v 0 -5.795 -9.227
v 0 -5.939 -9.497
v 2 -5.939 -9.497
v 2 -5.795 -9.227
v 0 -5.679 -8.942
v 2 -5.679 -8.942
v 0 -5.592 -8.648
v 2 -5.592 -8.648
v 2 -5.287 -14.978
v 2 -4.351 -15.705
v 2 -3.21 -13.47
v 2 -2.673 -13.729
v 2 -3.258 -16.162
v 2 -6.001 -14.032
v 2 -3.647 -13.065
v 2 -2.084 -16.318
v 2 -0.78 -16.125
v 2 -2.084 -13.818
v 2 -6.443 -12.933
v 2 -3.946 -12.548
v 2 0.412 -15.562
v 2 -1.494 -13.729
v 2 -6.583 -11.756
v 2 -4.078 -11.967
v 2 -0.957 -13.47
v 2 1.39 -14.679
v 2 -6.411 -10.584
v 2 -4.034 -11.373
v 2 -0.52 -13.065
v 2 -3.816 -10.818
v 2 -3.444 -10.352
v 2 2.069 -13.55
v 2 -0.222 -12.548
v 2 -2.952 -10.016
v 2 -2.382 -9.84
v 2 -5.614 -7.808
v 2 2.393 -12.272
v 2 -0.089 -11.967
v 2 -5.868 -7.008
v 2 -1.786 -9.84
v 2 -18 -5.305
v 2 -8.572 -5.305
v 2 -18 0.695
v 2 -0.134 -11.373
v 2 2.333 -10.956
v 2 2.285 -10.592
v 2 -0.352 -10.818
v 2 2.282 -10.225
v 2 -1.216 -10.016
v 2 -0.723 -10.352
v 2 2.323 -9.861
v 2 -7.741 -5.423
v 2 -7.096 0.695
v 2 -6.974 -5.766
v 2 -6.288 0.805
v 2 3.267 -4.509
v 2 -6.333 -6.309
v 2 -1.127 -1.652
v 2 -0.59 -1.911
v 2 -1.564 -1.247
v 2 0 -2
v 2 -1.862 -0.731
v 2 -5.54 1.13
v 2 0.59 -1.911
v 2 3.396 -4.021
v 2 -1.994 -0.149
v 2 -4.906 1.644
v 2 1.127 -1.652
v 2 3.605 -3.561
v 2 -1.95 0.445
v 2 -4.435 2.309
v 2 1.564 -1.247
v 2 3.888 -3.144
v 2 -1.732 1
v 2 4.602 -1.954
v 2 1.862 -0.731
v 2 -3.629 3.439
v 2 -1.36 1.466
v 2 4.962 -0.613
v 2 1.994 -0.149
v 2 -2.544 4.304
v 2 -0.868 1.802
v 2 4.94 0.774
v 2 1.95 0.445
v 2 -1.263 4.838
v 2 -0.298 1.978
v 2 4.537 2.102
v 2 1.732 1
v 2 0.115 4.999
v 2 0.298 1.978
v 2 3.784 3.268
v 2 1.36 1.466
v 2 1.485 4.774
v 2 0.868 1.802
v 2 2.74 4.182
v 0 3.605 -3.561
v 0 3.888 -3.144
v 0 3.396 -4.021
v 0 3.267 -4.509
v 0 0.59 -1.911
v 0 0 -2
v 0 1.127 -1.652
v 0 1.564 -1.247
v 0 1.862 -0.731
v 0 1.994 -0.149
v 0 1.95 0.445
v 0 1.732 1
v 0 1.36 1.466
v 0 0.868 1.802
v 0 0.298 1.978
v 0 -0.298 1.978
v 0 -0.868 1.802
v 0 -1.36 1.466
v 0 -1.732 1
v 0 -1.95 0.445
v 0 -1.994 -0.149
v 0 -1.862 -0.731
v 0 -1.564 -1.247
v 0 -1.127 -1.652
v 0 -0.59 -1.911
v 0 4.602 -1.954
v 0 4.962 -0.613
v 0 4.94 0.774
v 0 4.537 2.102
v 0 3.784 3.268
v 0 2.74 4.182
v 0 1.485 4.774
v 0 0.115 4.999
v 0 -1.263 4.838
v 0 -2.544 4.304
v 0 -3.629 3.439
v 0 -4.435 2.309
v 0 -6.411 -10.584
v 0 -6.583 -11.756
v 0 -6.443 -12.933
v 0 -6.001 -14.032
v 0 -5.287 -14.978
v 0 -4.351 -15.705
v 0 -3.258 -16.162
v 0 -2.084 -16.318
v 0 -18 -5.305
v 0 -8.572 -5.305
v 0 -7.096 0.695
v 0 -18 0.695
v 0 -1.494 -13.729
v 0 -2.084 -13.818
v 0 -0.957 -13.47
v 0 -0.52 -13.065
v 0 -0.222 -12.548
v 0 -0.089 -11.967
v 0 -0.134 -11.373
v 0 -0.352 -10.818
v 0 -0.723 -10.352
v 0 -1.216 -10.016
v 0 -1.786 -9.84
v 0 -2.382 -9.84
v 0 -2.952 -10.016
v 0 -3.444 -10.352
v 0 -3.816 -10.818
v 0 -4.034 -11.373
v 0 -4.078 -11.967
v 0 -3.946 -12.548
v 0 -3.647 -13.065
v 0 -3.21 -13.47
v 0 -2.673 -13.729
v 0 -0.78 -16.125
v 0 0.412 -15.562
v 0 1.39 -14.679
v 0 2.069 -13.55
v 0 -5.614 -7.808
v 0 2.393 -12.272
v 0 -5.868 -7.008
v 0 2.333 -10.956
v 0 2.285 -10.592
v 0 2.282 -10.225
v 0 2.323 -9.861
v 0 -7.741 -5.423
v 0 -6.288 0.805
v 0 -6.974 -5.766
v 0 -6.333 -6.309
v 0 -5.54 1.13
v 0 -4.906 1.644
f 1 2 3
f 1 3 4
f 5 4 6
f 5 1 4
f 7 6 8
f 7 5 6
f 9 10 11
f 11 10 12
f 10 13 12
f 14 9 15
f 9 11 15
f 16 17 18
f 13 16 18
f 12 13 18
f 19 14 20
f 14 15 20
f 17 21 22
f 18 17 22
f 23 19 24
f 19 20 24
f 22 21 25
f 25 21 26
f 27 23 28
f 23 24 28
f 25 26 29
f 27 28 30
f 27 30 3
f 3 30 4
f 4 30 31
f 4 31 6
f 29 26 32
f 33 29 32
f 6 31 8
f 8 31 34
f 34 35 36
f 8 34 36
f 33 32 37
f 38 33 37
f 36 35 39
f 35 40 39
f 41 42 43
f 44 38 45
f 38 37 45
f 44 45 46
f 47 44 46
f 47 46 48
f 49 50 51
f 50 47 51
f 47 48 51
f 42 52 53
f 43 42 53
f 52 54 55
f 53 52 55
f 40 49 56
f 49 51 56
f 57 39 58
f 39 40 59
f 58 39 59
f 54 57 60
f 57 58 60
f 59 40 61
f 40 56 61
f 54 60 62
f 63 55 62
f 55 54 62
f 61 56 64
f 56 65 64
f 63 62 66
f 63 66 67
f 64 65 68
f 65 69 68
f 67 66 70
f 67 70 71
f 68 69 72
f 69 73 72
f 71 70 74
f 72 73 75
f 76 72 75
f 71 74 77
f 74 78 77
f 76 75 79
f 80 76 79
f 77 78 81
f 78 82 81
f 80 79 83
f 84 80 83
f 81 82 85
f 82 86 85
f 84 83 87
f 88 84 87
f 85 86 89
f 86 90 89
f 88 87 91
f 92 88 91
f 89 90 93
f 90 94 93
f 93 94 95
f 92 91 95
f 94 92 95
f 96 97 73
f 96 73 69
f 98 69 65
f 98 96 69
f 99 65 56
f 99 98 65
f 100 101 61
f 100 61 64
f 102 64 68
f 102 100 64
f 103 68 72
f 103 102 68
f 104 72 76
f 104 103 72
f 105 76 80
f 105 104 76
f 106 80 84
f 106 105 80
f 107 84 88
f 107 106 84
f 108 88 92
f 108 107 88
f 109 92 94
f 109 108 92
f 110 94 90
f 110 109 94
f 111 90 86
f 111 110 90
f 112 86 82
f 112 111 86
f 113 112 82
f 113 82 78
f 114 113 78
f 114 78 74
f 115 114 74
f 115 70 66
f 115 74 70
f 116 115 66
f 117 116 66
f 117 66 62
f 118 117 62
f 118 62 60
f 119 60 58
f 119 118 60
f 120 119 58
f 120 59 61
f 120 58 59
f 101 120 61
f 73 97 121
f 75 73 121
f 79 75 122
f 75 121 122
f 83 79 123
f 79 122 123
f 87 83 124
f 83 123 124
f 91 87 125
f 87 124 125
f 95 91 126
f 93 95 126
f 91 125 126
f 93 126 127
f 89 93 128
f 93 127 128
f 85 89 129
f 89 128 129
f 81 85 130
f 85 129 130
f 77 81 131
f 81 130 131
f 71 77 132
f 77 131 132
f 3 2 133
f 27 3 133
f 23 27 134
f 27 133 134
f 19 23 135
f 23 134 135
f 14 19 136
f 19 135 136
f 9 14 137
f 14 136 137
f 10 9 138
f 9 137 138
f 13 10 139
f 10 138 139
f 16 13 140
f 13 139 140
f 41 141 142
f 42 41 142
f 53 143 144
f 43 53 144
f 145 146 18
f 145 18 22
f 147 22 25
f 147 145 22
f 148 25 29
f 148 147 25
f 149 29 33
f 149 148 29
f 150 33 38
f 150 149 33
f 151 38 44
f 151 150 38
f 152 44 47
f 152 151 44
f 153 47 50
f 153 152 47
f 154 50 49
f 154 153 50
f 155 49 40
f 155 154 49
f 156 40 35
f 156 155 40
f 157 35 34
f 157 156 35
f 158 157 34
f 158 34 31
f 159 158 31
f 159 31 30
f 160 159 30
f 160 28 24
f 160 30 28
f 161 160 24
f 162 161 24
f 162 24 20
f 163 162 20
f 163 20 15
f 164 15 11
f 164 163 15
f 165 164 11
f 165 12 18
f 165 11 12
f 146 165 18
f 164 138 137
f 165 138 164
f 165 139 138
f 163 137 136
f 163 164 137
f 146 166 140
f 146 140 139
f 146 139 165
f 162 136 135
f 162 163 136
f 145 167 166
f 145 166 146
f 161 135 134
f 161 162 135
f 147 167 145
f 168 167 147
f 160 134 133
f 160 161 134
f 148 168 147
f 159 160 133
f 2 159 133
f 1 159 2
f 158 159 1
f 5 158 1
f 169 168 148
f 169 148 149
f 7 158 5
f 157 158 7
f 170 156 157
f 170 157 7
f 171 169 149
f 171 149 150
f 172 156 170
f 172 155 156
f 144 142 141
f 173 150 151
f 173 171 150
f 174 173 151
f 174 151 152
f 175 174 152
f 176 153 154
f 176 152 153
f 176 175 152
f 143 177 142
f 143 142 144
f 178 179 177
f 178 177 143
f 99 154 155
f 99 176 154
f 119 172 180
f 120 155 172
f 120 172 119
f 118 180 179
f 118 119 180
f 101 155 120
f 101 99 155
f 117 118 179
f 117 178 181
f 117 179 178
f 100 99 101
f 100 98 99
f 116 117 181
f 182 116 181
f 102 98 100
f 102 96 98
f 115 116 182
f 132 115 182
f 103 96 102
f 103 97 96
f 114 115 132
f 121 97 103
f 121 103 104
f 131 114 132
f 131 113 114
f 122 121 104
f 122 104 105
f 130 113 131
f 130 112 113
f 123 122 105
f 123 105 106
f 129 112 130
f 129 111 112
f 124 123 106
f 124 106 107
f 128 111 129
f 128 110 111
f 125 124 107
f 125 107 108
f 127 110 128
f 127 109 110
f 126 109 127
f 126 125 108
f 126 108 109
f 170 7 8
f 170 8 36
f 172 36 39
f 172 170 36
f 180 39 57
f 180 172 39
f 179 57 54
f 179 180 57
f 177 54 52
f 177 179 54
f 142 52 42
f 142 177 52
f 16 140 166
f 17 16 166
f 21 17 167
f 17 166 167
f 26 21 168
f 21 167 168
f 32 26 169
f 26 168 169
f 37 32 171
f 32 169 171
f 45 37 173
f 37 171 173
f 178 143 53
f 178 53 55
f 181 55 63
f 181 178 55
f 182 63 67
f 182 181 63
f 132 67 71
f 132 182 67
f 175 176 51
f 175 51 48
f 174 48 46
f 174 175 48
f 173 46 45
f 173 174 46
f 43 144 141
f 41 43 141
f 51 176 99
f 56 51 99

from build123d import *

# Parameters (mm, degrees)
EXTRUDE_1_DEPTH          = 2
CUT_EXTRUDE_3_DEPTH      = 25.377594344
CUT_EXTRUDE_3_DEPTH_BACK = 25.377594344
SKETCH_1_3_R             = 2
FILLET_1_R               = 3


with BuildPart() as part:
    # 草图1 → 凸台-拉伸1 (new body)
    with BuildSketch(Plane(origin=(0, 0, 0), x_dir=(0, 0, -1), z_dir=(1, 0, 0))):
        with BuildLine():
            Line((0.694592711, 3.939231012), (-0.694592711, -3.939231012))
            Line((-0.694592711, -3.939231012), (3.079360166, -3.939231012))
            ThreePointArc((3.079360166, -3.939231012), (4.494263056, -2.191255253), (5, 0))
            ThreePointArc((5, 0), (4.650004293, 1.837786733), (3.64901597, 3.418286479))
            Line((3.64901597, 3.418286479), (0.694592711, 3.939231012))
        make_face()
        with BuildLine():
            Line((2.259830548, -4.460175545), (-0.694592711, -3.939231012))
            Line((-0.694592711, -3.939231012), (-0.694592711, -4.951519056))
            ThreePointArc((-0.694592711, -4.951519056), (0.820272506, -4.932256382), (2.259830548, -4.460175545))
        make_face()
        with BuildLine():
            Line((3.079360166, -3.939231012), (-0.694592711, -3.939231012))
            Line((-0.694592711, -3.939231012), (2.259830548, -4.460175545))
            ThreePointArc((2.259830548, -4.460175545), (2.68227239, -4.219646292), (3.079360166, -3.939231012))
        make_face()
        with BuildLine():
            Line((-0.694592711, -4.951519056), (-0.694592711, -3.939231012))
            Line((-0.694592711, -3.939231012), (0.694592711, 3.939231012))
            Line((0.694592711, 3.939231012), (3.64901597, 3.418286479))
            ThreePointArc((3.64901597, 3.418286479), (-4.437968609, 2.303135825), (-0.694592711, -4.951519056))
        make_face()
        with BuildLine():
            ThreePointArc((5, 0), (4.494263056, -2.191255253), (3.079360166, -3.939231012))
            Line((3.079360166, -3.939231012), (5.305407289, -3.939231012))
            Line((5.305407289, -3.939231012), (5.305407289, -4.997192896))
            Line((5.305407289, -4.997192896), (9.092867132, -5.665024255))
            ThreePointArc((9.092867132, -5.665024255), (7.386058148, -1.302361333), (10.482052554, 2.213437769))
            Line((10.482052554, 2.213437769), (3.64901597, 3.418286479))
            ThreePointArc((3.64901597, 3.418286479), (4.650004293, 1.837786733), (5, 0))
        make_face()
        with BuildLine():
            Line((5.305407289, -3.939231012), (3.079360166, -3.939231012))
            ThreePointArc((3.079360166, -3.939231012), (2.68227239, -4.219646292), (2.259830548, -4.460175545))
            Line((2.259830548, -4.460175545), (5.305407289, -4.997192896))
            Line((5.305407289, -4.997192896), (5.305407289, -3.939231012))
        make_face()
        with BuildLine():
            ThreePointArc((2.259830548, -4.460175545), (0.820272506, -4.932256382), (-0.694592711, -4.951519056))
            Line((-0.694592711, -4.951519056), (-0.694592711, -18))
            Line((-0.694592711, -18), (5.305407289, -18))
            Line((5.305407289, -18), (5.305407289, -4.997192896))
            Line((5.305407289, -4.997192896), (2.259830548, -4.460175545))
        make_face()
        with BuildLine():
            ThreePointArc((16.317693036, -2.083778132), (14.485990042, 1.539782422), (10.482052554, 2.213437769))
            Line((10.482052554, 2.213437769), (12.512285747, 1.85545288))
            Line((12.512285747, 1.85545288), (11.123100325, -6.023009144))
            Line((11.123100325, -6.023009144), (9.092867132, -5.665024255))
            ThreePointArc((9.092867132, -5.665024255), (13.816227929, -6.115633571), (16.317693036, -2.083778132))
        make_face()
        with BuildLine():
            Line((12.512285747, 1.85545288), (10.482052554, 2.213437769))
            ThreePointArc((10.482052554, 2.213437769), (7.386058148, -1.302361333), (9.092867132, -5.665024255))
            Line((9.092867132, -5.665024255), (11.123100325, -6.023009144))
            Line((11.123100325, -6.023009144), (12.512285747, 1.85545288))
        make_face()
    extrude(amount=EXTRUDE_1_DEPTH)

    # 草图1<3> → 切除-拉伸3 (cut, two sides: drawn at the far end of the back side and taken through both)
    with BuildSketch(Plane(origin=(0, 0, 0), x_dir=(0, 0, -1), z_dir=(1, 0, 0)).offset(-CUT_EXTRUDE_3_DEPTH_BACK)):
        Circle(SKETCH_1_3_R)
        with Locations((11.817693036, -2.083778132)):
            Circle(SKETCH_1_3_R)
    extrude(amount=CUT_EXTRUDE_3_DEPTH + CUT_EXTRUDE_3_DEPTH_BACK, mode=Mode.SUBTRACT)

    # 圆角1
    # the kernel refuses this fillet: 3 mm, written as the material it adds along each edge
    with BuildSketch(Plane(origin=(0, -4.951519056, 0.694592711), x_dir=(0, -1, 0), z_dir=(1, 0, 0))) as fillet_1_piece_1:
        with BuildLine():
            CenterArc((2.144253255, -3), FILLET_1_R, 90, 62.495124604)
            ThreePointArc((-0.516661362, -1.614527733), (-0.189409011, -0.829319334), (0, 0))
            Line((0, 0), (2.144253255, 0))
        make_face()
    extrude(amount=2)
    with BuildSketch(Plane(origin=(0, 3.418286479, -3.64901597), x_dir=(0, -0.17364817766699442, -0.9848077530121968), z_dir=(1, 0, 0))) as fillet_1_piece_2:
        with BuildLine():
            CenterArc((0.872983346, 3), FILLET_1_R, 241.044975628, 28.955024372)
            ThreePointArc((-0.579385409, 0.375), (-0.283214788, 0.19750856), (0, 0))
            Line((0, 0), (0.872983346, 0))
        make_face()
    extrude(amount=2)
    with BuildSketch(Plane(origin=(0, -4.997192896, -5.305407289), x_dir=(0, -0.17364817766692767, -0.9848077530122085), z_dir=(1, 0, 0))) as fillet_1_piece_3:
        with BuildLine():
            CenterArc((FILLET_1_R * 1.19175359259, -FILLET_1_R), FILLET_1_R, 90, 100)
            Line((FILLET_1_R * 0.206945839582, -FILLET_1_R * 1.17364817767), (0, 0))
            Line((0, 0), (FILLET_1_R * 1.19175359259, 0))
        make_face()
    extrude(amount=2)
    with BuildSketch(Plane(origin=(0, -5.665024255, -9.092867132), x_dir=(0, 0.17364817766698767, 0.9848077530121979), z_dir=(1, 0, 0))) as fillet_1_piece_4:
        with BuildLine():
            CenterArc((0.631029591, 3), FILLET_1_R, 248.960530219, 21.039469781)
            ThreePointArc((-0.446003371, 0.2), (-0.220284161, 0.106060125), (0, 0))
            Line((0, 0), (0.631029591, 0))
        make_face()
    extrude(amount=2)
    with BuildSketch(Plane(origin=(0, 2.213437769, -10.482052554), x_dir=(0, 0.2445079523565027, -0.9696472870247357), z_dir=(1, 0, 0))) as fillet_1_piece_5:
        with BuildLine():
            CenterArc((0.651724559, 2.995572307), FILLET_1_R, 245.847242884, 21.039469781)
            Line((-0.575787876, 0.25819889), (0, 0))
            ThreePointArc((0, 0), (0.24439671, 0.00664154), (0.488793419, 0))
        make_face()
    extrude(amount=2)


solid = part.part
